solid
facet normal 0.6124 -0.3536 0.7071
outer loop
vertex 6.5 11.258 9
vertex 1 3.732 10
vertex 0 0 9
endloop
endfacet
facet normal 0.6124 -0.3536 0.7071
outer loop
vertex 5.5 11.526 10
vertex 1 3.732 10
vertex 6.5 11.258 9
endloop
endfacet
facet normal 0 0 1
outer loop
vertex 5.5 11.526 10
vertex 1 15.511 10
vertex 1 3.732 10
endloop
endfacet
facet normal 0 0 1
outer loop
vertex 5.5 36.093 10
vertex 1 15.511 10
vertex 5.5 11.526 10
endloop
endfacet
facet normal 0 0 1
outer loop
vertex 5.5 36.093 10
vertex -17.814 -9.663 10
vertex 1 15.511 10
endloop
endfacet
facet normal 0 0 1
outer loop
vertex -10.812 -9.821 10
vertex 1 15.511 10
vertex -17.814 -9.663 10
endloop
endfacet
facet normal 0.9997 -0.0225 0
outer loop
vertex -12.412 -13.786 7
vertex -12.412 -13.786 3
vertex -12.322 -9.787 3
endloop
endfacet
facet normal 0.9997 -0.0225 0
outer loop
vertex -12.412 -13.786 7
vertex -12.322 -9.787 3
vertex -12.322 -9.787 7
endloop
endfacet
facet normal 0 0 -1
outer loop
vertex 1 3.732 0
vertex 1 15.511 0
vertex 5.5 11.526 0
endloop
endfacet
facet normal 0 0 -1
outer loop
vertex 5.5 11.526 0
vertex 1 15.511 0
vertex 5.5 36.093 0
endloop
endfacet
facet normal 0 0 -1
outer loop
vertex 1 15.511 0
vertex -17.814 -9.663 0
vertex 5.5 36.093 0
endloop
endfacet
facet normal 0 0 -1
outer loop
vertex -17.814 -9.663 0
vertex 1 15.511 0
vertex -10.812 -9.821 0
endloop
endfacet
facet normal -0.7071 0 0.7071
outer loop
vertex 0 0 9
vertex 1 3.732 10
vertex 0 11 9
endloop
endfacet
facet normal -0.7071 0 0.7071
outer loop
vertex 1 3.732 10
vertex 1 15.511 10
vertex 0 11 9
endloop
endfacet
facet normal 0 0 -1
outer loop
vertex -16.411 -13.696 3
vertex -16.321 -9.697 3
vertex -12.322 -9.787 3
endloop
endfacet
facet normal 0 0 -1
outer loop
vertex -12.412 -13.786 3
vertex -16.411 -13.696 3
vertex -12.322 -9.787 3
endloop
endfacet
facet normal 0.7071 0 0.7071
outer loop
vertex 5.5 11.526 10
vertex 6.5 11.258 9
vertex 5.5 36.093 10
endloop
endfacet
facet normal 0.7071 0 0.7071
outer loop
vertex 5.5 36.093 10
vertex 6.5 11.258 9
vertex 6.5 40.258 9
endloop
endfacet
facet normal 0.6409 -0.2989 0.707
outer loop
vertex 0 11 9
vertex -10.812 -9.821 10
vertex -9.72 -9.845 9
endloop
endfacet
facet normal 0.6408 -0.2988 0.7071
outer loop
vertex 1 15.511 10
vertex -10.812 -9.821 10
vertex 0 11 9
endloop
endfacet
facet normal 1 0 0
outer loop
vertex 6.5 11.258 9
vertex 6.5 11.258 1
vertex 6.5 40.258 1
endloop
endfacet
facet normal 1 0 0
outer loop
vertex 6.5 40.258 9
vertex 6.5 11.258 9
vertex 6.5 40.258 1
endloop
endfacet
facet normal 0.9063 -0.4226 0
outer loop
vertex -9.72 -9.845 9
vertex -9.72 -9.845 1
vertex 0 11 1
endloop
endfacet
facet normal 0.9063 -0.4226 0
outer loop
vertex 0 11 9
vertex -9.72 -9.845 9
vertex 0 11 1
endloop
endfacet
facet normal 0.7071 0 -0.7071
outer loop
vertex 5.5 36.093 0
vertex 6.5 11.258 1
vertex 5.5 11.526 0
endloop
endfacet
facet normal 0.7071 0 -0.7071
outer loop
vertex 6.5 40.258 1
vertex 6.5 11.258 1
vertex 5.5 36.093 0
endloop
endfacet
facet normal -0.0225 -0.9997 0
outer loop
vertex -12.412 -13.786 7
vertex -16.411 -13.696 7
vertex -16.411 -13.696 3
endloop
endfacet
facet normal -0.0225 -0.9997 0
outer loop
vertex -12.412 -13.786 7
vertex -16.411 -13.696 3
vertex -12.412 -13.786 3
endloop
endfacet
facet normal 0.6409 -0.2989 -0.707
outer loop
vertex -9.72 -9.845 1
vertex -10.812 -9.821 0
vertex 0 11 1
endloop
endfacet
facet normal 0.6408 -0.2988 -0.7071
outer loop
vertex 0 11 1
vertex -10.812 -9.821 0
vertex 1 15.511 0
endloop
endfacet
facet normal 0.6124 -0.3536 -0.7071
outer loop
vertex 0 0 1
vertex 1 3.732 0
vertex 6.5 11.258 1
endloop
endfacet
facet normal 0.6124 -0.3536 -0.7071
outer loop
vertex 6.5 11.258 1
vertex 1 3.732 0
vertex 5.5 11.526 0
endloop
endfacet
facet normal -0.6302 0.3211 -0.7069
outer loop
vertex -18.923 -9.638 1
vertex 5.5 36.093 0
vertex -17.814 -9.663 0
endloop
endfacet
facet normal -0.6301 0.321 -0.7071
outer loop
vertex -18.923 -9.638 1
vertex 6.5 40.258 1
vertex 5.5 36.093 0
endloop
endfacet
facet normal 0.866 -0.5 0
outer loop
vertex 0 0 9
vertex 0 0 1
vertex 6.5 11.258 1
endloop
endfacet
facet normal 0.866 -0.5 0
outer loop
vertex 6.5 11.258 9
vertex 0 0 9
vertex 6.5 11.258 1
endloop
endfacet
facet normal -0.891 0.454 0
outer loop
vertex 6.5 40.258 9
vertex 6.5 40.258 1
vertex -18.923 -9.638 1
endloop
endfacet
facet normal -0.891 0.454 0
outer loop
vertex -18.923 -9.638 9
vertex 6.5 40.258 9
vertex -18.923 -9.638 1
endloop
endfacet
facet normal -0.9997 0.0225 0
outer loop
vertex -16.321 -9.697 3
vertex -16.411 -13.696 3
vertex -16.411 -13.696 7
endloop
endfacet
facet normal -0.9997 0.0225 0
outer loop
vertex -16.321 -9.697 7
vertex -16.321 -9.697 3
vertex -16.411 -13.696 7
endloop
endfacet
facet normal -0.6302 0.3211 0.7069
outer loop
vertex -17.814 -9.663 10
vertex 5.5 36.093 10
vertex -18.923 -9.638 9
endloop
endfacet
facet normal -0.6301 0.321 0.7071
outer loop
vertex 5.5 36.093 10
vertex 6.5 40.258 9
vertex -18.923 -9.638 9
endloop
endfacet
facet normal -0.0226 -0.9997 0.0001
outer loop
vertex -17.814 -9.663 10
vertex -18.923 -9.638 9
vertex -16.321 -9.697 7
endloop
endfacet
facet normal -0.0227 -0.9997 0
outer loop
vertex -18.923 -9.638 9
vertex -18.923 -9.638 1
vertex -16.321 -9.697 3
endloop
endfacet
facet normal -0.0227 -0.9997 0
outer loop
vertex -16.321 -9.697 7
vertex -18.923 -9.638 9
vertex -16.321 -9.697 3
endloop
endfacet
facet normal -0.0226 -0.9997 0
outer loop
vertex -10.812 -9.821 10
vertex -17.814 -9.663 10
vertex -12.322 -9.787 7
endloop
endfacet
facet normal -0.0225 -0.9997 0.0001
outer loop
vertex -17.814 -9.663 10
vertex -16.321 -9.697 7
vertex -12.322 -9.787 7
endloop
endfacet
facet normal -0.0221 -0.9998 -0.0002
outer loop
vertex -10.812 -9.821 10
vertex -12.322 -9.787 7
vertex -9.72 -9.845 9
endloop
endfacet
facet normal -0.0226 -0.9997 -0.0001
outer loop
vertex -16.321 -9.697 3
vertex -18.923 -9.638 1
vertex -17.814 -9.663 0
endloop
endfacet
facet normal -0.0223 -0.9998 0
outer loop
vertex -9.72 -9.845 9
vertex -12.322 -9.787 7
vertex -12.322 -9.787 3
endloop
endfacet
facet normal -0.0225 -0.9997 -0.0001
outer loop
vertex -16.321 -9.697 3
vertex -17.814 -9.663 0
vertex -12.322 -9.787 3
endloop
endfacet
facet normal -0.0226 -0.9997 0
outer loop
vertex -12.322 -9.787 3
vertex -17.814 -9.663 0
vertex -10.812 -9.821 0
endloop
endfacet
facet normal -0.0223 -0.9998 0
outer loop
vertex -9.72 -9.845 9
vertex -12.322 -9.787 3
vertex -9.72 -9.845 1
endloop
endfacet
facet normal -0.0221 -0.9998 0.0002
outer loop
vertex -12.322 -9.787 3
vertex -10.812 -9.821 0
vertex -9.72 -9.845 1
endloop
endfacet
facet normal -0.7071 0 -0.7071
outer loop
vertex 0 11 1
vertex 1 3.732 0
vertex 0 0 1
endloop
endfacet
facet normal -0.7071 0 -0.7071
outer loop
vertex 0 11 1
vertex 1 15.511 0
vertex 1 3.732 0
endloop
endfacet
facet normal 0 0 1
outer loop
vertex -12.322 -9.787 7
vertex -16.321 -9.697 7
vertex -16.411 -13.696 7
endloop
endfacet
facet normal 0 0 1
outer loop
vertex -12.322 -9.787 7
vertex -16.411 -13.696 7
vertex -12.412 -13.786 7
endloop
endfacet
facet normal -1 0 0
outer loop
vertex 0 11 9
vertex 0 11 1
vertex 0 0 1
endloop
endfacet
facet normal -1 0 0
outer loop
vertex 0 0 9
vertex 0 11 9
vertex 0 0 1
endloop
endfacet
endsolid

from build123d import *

# Parameters (mm, degrees)
F1_DEPTH = 10
F2_W     = 4
F2_H     = 4
F3_DEPTH = 4
F4_SIZE  = 1


with BuildPart() as f1:
    # F0 (on Top) → F1 (new body)
    with BuildSketch(Plane.XY):
        Polygon((0, 11), (0, 0), (6.5, 11.2583302492), (6.5, 40.2583302492), (-18.9234679854, -9.6380351054), (-9.72022002, -9.8450791018), align=None)
    extrude(amount=F1_DEPTH)

    # F2 (on face) → F3 (join)
    with BuildSketch(Plane(origin=(-0.2262881219, -10.0586625682, 0), x_dir=(0.9997470421, -0.0224911492, 0), z_dir=(-0.0224911492, -0.9997470421, 0))):
        with Locations((-14.0991223651, 5)):
            Rectangle(F2_W, F2_H)
    extrude(amount=F3_DEPTH)

    # F4
    f4_edges = [f1.edges().sort_by_distance(p)[0] for p in [
        (-4.86011, 0.57746, 10),
        (0, 5.5, 10),
        (3.25, 5.629165, 10),
        (6.5, 25.75833, 10),
        (-6.211734, 15.310148, 10),
        (6.5, 25.75833, 0),
        (-6.211734, 15.310148, 0),
        (3.25, 5.629165, 0),
        (0, 5.5, 0),
        (-4.86011, 0.57746, 0),
    ]]
    chamfer(f4_edges, length=F4_SIZE)


solid = f1.part
